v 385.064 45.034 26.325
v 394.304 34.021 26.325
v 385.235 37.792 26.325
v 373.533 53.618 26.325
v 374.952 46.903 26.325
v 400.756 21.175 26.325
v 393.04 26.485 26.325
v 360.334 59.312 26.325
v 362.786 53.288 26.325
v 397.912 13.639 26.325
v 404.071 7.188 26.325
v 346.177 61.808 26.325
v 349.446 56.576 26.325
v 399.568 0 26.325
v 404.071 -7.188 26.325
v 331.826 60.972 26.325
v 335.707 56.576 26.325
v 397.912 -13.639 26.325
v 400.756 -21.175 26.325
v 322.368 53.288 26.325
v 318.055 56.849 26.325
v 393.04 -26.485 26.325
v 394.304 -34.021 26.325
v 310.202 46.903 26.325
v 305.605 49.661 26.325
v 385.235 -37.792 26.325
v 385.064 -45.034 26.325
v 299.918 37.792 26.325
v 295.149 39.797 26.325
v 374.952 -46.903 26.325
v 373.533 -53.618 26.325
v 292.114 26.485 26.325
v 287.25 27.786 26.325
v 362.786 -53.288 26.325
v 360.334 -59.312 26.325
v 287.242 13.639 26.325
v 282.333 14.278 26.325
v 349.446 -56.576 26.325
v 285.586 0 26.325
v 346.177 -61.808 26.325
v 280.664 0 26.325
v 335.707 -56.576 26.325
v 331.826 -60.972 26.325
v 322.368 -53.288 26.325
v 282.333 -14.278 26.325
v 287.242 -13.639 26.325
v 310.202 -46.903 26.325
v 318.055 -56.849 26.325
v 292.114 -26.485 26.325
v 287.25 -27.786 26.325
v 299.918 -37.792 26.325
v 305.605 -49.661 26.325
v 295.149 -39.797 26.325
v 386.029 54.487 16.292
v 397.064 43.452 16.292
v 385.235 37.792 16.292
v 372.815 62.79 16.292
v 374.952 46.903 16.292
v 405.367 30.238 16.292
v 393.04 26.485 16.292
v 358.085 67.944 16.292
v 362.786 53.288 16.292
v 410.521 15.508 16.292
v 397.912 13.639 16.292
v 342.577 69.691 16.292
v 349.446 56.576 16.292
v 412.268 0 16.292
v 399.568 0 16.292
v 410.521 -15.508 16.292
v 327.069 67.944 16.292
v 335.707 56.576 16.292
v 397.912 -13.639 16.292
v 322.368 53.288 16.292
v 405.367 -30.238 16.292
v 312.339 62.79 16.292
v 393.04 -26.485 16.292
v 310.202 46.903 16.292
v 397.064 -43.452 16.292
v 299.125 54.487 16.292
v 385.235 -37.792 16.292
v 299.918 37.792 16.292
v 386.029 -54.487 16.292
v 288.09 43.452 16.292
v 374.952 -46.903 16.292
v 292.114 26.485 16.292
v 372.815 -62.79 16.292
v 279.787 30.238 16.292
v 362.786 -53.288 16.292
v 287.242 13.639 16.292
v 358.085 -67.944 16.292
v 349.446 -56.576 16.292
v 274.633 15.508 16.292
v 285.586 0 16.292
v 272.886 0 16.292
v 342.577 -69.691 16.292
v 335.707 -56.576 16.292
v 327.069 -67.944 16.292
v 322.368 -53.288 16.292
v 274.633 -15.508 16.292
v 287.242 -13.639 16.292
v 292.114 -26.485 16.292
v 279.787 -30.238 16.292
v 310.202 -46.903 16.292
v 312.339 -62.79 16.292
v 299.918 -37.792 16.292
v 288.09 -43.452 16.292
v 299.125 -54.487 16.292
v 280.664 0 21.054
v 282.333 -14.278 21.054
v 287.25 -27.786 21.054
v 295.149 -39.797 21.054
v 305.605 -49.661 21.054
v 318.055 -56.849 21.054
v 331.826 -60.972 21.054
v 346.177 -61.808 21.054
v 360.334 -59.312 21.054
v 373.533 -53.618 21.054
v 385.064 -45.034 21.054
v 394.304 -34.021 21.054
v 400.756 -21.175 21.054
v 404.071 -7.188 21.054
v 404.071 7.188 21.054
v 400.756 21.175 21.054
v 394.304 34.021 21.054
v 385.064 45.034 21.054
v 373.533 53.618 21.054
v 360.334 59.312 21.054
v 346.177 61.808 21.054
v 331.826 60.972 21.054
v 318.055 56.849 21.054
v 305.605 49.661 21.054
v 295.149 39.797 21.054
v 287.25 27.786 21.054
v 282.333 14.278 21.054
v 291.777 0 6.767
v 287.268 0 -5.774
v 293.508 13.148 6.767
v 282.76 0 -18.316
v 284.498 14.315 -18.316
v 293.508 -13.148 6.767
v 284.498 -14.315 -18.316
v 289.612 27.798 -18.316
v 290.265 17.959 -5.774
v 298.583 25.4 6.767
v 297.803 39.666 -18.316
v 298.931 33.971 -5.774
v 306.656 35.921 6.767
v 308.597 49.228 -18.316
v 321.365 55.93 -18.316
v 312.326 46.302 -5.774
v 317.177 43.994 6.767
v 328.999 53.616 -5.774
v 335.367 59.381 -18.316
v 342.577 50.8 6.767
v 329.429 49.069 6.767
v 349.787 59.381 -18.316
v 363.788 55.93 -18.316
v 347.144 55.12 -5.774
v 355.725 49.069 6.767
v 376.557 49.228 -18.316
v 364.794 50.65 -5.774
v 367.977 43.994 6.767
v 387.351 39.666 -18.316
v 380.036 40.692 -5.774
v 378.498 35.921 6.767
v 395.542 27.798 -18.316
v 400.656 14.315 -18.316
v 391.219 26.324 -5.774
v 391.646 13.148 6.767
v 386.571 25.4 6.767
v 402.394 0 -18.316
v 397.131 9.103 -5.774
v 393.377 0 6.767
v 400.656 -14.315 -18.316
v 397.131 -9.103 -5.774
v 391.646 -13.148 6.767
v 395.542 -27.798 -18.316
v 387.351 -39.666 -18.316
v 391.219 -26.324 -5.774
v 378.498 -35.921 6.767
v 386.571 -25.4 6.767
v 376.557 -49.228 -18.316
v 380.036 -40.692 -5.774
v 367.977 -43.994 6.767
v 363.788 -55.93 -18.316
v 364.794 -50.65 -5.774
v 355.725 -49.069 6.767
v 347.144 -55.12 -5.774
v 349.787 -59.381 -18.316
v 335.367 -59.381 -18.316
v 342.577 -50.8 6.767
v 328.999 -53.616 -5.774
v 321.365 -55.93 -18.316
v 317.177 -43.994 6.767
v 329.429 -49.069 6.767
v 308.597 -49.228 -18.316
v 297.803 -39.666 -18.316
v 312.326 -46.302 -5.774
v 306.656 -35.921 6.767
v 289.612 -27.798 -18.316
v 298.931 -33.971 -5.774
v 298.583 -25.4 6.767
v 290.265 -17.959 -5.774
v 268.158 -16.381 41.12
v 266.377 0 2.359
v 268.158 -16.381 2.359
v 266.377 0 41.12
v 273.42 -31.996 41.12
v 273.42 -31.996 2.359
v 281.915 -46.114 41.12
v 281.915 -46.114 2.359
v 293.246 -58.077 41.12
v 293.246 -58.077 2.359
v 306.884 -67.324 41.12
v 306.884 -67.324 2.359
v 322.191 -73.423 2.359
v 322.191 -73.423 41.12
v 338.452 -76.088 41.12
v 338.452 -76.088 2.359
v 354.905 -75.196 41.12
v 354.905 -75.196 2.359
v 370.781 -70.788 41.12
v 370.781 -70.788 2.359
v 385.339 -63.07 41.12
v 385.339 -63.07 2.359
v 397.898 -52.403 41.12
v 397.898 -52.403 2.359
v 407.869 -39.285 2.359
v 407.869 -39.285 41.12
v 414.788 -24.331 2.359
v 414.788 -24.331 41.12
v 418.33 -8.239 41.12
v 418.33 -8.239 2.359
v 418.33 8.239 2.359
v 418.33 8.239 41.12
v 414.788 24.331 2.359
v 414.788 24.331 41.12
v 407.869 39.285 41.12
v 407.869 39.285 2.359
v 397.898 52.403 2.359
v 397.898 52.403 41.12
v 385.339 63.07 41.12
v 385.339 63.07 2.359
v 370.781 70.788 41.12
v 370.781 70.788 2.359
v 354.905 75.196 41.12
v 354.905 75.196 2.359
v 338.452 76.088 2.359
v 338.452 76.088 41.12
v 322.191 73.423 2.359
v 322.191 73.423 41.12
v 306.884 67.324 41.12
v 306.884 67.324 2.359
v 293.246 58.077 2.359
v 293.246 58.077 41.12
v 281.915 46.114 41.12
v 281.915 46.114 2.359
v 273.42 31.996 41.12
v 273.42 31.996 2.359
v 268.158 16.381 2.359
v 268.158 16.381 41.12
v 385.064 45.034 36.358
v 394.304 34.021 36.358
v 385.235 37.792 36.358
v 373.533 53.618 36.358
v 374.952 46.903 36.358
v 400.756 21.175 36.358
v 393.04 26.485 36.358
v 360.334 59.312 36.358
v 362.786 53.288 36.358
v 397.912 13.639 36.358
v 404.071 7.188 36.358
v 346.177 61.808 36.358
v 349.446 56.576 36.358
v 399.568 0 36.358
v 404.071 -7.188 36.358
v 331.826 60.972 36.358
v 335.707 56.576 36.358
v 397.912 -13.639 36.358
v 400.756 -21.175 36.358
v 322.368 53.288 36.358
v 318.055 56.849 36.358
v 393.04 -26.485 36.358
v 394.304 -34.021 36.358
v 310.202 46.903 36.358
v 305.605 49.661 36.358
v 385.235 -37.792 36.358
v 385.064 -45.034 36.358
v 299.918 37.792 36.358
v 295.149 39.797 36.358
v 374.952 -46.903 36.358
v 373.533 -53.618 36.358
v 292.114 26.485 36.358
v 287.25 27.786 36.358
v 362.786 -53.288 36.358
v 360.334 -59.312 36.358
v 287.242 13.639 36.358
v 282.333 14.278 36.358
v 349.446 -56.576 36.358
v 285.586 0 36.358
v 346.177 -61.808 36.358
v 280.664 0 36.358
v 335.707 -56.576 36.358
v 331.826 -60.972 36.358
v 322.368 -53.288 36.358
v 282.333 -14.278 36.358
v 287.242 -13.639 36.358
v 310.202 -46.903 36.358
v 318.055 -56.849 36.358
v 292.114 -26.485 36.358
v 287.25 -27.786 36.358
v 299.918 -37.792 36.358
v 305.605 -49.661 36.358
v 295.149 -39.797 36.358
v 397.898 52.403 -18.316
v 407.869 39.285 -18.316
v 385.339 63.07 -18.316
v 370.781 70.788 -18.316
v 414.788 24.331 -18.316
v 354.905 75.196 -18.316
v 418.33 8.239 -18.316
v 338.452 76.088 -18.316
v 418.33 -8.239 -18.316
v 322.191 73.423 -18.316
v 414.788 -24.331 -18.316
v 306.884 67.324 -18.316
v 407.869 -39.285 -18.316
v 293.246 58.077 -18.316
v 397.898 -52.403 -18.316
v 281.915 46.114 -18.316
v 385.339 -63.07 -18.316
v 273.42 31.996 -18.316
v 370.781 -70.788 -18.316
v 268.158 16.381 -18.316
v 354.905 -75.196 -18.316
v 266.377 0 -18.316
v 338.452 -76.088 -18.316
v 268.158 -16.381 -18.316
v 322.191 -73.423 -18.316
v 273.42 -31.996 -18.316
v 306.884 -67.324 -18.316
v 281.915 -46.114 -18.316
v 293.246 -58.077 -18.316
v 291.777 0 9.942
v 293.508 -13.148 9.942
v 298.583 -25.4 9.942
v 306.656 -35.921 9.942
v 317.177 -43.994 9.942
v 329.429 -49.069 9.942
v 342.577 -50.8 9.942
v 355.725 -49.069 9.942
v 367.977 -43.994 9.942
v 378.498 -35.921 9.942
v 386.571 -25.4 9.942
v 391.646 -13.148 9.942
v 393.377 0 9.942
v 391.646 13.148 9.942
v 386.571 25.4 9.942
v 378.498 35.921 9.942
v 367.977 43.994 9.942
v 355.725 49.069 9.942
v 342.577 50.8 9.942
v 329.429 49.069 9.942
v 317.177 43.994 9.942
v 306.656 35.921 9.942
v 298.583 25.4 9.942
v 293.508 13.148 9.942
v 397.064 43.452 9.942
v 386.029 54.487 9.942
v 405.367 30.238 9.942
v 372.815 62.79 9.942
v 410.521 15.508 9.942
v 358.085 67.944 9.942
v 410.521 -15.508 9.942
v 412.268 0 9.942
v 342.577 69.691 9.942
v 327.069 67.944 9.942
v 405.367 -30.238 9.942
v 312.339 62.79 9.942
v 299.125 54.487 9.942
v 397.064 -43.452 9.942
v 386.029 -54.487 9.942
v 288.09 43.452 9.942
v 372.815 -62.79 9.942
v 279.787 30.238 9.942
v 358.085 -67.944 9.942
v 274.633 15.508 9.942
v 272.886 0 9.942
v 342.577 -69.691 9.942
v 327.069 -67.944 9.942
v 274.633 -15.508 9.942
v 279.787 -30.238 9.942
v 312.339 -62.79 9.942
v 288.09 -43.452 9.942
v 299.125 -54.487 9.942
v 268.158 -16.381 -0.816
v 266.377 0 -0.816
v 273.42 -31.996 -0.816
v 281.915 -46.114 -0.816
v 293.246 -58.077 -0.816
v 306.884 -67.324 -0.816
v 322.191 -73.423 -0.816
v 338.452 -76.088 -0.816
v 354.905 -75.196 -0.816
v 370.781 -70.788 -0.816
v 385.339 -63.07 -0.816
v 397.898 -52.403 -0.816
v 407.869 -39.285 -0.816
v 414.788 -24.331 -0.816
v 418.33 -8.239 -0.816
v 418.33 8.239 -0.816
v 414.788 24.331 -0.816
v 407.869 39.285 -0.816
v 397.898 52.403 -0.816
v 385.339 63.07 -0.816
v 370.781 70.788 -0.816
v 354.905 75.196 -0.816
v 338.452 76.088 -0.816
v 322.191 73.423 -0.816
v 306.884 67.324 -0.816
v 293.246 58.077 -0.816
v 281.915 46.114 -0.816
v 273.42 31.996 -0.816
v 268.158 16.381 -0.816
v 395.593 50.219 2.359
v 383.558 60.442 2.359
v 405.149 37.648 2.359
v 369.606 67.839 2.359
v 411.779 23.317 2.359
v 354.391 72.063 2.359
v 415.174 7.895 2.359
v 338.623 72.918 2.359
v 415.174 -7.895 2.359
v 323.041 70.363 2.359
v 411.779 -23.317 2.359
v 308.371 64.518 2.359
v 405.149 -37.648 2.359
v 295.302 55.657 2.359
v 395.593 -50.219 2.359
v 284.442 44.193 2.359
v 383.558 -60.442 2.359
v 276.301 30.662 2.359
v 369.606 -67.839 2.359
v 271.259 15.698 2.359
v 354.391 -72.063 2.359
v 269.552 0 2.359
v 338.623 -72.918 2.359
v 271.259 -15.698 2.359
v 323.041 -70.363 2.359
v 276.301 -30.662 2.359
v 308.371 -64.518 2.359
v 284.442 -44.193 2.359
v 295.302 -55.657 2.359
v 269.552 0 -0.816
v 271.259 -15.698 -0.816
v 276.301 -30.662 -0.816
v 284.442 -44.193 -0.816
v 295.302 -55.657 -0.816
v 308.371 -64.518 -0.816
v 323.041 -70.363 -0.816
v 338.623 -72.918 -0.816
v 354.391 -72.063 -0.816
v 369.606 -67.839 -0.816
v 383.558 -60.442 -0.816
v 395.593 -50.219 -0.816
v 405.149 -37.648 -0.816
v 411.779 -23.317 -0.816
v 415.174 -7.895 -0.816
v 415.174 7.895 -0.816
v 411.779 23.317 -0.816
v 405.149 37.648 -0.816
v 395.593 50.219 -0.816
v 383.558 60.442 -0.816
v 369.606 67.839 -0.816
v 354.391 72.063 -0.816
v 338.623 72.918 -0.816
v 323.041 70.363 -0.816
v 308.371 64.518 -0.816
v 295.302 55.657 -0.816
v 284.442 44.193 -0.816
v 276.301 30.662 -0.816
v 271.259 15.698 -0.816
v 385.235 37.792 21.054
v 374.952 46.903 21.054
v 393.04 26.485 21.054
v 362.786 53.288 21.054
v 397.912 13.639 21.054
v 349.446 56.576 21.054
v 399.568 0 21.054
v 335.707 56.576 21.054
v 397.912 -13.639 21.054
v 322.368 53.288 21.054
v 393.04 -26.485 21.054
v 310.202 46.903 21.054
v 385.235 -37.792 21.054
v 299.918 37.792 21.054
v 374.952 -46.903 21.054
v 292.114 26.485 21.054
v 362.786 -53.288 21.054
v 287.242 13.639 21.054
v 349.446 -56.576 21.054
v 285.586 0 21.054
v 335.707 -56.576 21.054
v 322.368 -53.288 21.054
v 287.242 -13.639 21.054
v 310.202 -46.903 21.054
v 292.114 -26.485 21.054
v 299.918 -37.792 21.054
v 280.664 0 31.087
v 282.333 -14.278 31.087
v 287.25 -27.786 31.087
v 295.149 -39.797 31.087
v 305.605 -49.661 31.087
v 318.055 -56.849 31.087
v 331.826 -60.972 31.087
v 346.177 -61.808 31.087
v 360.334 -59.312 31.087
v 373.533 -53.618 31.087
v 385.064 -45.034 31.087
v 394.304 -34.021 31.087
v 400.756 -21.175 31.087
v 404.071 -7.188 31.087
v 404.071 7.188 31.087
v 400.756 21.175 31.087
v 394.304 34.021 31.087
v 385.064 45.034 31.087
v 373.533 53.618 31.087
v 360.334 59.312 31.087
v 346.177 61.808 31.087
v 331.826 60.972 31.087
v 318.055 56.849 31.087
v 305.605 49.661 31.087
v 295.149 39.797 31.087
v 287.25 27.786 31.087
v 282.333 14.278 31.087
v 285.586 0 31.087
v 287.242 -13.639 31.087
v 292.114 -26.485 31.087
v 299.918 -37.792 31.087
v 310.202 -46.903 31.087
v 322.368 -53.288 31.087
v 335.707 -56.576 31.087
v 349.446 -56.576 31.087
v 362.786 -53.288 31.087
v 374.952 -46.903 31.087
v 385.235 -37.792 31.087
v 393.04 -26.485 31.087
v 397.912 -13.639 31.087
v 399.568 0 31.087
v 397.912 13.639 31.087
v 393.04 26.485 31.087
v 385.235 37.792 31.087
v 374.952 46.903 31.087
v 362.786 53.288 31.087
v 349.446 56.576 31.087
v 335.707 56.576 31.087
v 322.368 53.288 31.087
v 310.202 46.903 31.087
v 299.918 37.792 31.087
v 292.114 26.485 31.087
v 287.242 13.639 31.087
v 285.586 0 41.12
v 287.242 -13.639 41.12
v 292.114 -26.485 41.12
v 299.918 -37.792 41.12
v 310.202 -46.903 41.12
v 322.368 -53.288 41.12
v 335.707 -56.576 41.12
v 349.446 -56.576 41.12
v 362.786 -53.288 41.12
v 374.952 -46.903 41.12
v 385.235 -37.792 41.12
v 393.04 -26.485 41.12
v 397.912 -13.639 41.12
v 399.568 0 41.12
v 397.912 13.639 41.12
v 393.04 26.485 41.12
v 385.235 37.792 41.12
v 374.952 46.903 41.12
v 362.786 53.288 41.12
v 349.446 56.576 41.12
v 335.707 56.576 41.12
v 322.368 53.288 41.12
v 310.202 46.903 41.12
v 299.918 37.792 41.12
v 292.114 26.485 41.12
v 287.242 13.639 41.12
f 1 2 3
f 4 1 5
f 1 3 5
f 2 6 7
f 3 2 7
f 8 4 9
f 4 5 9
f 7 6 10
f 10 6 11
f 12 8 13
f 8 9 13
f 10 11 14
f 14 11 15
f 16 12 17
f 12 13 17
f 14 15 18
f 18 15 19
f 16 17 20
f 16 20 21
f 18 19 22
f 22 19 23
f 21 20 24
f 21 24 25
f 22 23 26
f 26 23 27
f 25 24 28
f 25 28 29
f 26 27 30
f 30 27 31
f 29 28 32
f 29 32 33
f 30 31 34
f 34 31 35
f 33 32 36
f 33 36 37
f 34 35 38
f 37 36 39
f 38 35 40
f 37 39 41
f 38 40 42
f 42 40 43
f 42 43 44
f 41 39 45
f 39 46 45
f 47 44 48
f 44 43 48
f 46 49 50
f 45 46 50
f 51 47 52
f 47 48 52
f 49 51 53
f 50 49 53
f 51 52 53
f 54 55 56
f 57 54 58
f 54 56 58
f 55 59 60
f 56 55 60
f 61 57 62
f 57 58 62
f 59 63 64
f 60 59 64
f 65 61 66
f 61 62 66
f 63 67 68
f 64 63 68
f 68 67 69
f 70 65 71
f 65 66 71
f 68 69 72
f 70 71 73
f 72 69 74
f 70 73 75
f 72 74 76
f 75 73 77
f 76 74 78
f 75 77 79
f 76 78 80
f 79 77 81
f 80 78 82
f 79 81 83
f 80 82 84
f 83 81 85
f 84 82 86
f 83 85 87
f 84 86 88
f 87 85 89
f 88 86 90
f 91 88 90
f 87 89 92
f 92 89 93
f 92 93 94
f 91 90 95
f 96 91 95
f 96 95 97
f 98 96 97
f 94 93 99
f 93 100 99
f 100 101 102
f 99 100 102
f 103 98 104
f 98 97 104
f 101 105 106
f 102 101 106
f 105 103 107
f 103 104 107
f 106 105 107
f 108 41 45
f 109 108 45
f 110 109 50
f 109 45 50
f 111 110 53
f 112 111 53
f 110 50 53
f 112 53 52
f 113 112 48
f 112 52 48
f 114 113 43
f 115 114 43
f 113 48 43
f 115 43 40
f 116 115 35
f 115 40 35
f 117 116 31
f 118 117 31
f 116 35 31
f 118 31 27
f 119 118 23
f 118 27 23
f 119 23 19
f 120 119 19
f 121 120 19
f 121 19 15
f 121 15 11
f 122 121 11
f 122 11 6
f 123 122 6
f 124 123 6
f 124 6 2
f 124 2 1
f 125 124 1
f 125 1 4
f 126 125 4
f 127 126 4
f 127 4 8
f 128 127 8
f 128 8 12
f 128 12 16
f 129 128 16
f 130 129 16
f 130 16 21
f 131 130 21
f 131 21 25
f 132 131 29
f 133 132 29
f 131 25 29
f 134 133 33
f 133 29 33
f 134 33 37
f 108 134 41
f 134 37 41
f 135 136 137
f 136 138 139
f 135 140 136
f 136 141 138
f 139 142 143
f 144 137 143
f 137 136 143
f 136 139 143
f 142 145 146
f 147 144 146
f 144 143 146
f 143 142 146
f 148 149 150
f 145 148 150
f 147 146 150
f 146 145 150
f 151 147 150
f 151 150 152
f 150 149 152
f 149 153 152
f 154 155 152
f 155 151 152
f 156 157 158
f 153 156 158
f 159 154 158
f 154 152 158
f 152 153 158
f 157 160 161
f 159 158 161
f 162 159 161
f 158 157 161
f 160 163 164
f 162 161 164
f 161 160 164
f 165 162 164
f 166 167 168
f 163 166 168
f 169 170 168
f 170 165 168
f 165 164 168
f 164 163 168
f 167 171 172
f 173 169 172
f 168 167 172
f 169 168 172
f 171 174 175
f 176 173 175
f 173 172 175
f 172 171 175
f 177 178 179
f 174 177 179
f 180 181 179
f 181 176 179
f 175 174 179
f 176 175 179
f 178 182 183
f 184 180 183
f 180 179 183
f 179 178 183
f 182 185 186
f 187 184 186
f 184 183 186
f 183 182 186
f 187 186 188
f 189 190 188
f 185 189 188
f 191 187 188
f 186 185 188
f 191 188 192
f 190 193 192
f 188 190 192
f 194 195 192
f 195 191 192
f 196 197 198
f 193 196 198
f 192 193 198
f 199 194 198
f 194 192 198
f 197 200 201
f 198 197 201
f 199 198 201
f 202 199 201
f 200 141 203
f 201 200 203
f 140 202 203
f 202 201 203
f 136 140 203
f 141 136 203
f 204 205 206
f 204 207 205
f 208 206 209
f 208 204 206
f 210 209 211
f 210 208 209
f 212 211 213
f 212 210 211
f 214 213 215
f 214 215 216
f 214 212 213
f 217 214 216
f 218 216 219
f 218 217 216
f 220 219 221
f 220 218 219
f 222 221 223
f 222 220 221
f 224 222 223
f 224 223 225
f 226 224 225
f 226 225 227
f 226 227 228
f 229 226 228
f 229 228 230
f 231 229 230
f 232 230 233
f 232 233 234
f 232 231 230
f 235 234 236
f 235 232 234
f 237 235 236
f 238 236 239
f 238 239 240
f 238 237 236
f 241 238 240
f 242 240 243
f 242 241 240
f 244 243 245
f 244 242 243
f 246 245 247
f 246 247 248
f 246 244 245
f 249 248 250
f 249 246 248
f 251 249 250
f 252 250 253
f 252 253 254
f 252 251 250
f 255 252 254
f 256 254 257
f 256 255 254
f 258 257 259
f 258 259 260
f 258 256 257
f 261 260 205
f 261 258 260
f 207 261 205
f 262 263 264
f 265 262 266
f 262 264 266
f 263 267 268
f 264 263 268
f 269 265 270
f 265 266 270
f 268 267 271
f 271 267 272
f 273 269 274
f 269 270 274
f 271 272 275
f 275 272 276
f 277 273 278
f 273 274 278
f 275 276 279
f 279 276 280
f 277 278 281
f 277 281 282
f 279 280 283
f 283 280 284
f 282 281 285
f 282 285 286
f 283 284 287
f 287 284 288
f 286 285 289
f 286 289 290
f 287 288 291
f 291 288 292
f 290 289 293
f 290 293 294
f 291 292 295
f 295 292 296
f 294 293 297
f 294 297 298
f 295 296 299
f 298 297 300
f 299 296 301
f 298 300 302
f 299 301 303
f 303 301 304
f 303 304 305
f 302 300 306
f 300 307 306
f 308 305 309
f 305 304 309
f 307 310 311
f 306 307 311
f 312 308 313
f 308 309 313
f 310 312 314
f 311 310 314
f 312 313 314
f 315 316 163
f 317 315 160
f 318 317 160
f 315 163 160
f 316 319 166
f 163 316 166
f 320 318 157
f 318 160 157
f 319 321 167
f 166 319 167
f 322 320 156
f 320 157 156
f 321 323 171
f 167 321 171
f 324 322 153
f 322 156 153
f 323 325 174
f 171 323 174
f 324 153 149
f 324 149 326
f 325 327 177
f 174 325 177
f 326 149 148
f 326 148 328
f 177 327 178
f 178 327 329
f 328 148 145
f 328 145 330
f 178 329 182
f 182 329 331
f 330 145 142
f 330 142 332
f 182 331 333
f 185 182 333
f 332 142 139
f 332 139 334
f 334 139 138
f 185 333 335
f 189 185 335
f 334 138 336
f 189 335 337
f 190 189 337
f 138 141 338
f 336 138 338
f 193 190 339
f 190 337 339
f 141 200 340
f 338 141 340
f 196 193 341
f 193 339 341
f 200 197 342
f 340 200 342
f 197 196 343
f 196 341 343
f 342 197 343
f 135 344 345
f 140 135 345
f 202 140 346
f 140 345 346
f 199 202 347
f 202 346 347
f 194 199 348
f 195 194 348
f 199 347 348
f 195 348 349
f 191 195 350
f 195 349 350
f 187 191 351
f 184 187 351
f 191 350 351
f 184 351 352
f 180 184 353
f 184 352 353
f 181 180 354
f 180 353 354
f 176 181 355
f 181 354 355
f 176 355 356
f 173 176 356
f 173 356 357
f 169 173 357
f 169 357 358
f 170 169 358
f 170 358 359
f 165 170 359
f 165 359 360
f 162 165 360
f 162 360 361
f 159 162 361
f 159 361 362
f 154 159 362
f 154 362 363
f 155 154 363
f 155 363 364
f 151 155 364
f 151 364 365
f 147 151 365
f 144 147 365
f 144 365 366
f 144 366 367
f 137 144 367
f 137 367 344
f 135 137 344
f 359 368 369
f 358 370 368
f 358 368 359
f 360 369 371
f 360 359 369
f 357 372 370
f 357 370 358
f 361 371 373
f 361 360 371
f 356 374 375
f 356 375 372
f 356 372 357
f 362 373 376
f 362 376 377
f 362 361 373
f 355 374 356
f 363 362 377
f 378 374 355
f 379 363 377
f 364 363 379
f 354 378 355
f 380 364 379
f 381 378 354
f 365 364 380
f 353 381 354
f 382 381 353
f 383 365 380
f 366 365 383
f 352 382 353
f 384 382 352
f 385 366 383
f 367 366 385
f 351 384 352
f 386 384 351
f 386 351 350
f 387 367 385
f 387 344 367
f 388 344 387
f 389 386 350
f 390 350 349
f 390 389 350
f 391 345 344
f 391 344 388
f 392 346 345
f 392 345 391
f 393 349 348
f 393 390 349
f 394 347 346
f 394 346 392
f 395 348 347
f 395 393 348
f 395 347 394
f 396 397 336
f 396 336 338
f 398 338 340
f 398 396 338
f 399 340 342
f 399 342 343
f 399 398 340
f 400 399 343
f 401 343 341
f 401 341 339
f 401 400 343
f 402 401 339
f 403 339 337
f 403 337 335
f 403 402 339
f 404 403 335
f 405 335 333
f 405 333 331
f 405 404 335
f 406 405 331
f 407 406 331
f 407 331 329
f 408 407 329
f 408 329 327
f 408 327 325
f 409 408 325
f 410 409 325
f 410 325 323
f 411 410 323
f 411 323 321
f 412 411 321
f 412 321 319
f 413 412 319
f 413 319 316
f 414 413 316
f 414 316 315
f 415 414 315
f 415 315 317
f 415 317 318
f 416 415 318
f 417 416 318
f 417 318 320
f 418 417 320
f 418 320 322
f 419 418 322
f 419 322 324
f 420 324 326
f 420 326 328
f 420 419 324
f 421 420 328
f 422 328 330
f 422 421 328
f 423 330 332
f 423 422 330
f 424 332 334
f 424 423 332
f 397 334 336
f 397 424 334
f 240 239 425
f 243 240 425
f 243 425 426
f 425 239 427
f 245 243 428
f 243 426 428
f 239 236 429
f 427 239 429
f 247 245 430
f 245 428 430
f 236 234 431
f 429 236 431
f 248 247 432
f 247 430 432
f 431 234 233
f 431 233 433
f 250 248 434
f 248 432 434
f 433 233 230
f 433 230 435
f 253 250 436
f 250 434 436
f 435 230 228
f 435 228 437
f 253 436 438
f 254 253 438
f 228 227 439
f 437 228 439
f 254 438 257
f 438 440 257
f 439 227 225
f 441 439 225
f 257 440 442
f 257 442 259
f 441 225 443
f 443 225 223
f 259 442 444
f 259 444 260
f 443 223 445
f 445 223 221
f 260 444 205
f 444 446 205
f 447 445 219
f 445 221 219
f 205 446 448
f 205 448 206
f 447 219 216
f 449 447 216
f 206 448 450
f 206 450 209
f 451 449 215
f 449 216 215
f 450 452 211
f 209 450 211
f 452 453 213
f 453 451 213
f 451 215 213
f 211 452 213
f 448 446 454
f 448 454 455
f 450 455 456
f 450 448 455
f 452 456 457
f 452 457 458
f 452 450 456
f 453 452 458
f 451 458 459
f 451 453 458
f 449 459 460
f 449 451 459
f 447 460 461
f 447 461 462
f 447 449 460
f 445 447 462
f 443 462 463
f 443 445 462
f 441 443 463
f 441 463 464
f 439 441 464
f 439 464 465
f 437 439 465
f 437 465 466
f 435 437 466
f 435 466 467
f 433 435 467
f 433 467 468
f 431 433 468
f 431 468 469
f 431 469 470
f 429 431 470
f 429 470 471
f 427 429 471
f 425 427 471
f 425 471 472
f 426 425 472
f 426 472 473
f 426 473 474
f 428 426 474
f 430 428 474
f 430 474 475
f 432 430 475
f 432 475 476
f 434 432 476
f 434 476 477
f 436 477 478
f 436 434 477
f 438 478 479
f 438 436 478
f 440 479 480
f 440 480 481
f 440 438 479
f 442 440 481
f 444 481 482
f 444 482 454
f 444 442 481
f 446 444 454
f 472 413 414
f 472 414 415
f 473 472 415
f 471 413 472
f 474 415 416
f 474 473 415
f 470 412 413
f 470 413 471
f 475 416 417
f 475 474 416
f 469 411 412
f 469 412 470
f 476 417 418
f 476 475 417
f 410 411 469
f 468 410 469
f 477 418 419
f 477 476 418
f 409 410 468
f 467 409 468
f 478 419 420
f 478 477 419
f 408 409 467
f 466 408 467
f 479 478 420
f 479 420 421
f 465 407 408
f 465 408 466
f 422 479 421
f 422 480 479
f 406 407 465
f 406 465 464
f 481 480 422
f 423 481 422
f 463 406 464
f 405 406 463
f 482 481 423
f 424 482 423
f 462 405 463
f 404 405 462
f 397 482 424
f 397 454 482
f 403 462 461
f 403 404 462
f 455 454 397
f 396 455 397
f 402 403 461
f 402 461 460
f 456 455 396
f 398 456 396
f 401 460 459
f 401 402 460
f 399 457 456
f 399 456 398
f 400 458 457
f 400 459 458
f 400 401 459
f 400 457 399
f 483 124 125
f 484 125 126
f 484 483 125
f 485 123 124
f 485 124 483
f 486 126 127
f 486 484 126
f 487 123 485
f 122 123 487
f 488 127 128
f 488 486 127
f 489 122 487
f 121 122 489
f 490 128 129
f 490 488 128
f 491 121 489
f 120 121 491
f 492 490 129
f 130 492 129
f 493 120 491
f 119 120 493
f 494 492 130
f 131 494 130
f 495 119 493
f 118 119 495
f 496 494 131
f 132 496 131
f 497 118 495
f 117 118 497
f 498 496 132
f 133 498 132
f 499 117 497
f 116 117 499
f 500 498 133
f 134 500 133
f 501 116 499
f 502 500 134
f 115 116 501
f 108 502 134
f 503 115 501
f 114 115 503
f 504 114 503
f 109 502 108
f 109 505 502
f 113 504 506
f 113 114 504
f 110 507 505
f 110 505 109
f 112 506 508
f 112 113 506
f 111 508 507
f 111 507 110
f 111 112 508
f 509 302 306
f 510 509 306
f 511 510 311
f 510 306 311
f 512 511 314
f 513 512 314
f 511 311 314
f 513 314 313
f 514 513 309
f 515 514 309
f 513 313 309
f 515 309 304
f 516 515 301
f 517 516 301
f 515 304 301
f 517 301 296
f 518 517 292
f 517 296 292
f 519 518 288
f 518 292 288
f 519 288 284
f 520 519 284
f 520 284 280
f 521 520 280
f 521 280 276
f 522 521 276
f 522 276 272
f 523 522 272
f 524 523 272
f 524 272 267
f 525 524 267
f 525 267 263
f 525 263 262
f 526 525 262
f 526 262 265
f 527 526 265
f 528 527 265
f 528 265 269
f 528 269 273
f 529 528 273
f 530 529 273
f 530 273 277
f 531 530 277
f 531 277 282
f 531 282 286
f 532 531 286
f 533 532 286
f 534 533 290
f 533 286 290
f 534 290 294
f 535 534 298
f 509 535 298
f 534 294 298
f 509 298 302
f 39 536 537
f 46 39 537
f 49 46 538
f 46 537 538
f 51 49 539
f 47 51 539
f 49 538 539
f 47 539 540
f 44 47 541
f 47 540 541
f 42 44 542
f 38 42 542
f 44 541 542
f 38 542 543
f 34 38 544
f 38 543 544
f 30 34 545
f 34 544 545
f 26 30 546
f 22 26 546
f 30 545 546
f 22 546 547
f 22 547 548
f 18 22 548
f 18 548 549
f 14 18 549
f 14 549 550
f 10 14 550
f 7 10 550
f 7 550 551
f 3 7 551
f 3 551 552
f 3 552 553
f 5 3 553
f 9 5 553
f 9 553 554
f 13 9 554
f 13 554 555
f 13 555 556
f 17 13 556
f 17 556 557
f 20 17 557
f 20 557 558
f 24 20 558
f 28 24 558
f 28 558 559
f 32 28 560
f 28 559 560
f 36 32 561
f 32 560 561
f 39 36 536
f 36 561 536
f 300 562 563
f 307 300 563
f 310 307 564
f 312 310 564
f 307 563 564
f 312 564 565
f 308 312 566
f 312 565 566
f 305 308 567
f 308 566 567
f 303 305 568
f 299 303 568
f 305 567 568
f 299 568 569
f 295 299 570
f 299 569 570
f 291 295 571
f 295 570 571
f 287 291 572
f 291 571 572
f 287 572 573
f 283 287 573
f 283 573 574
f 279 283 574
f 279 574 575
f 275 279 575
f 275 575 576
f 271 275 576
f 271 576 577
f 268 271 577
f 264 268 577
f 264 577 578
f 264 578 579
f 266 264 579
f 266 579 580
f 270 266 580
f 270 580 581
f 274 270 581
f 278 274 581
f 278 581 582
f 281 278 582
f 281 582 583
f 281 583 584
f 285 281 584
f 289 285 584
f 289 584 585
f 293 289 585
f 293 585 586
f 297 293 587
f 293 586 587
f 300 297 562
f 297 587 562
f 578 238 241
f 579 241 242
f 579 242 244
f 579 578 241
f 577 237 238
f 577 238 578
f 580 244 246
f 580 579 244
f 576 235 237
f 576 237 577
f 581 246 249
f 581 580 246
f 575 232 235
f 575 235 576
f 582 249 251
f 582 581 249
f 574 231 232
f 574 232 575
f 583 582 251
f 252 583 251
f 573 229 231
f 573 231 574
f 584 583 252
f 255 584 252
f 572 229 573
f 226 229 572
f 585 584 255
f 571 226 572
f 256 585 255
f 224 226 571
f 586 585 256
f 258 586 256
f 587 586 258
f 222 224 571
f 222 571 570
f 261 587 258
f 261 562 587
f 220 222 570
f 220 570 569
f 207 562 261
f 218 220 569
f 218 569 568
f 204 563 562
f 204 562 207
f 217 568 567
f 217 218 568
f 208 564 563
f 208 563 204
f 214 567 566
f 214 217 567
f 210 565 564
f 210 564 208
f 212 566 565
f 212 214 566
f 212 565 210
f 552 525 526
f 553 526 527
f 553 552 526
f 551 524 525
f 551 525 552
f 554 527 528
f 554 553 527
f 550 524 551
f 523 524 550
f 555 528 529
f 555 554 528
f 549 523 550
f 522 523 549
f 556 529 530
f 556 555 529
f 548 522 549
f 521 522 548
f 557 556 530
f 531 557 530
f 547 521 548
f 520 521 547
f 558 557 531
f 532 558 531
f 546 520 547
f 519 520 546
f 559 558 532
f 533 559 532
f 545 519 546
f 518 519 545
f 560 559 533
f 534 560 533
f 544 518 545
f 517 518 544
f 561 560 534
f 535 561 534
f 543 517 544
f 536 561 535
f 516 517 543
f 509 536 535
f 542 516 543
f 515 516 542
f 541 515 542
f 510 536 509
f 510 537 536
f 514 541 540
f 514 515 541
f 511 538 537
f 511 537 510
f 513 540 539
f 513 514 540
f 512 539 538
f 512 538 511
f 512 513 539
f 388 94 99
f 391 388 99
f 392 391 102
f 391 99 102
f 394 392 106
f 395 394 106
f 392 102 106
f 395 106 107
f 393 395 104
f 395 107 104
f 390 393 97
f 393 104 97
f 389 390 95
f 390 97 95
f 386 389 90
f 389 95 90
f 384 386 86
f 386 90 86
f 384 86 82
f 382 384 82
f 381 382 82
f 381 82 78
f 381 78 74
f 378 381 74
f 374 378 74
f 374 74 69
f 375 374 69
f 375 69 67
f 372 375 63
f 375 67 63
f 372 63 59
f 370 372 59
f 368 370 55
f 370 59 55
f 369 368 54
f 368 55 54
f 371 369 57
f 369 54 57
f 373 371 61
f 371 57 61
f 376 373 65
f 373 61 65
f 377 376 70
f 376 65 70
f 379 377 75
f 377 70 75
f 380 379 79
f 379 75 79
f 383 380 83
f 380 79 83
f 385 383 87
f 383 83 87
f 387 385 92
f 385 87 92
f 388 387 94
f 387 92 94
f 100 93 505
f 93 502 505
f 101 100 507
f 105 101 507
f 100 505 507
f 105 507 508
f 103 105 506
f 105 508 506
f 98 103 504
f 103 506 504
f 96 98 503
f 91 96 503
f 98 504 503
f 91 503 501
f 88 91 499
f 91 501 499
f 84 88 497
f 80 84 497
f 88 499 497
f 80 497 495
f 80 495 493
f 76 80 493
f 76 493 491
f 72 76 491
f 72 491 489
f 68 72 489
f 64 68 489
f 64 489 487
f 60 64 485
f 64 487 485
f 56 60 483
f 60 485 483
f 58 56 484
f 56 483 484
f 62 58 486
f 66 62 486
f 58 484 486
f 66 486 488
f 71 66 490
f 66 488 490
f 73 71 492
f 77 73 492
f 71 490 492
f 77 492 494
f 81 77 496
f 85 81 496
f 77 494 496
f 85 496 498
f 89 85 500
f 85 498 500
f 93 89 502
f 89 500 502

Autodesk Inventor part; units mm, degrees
ref_plane "YZ Plane" through (0, 0, 0) normal (1, 0, 0) x (0, 1, 0)
ref_plane "XZ Plane" through (0, 0, 0) normal (0, 1, 0) x (-1, 0, 0)
ref_plane "XY Plane" through (0, 0, 0) normal (0, 0, 1) x (1, 0, 0)
sketch "Sketch5" plane through (0, 0, 0) normal (0, 1, 0) x (-1, 0, 0)
  line L0 (-272.8857, 16.2919) -> (-285.5857, 16.2919)
  line L1 (-285.5857, 16.2919) -> (-285.5857, 21.0544)
  line L2 (-285.5857, 21.0544) -> (-280.6644, 21.0544)
  line L3 (-280.6644, 26.3249) -> (-285.5857, 26.3249)
  line L4 (-280.6644, 21.0544) -> (-280.6644, 26.3249)
  line L5 (-280.6644, 31.0874) -> (-285.5857, 31.0874)
  line L6 (-285.5857, 26.3249) -> (-285.5857, 31.0874)
  line L7 (-280.6644, 31.0874) -> (-280.6644, 36.3579)
  line L8 (-285.5857, 36.3579) -> (-285.5857, 41.1204)
  line L9 (-285.5857, 41.1204) -> (-266.3769, 41.1204)
  line L10 (-272.8857, 9.9419) -> (-272.8857, 16.2919)
  line L11 (-266.3769, -18.3156) -> (-266.3769, 41.1204)
  line L12 (-291.7769, 9.9419) -> (-272.8857, 9.9419)
  line L13 (-282.7599, -18.3156) -> (-266.3769, -18.3156)
  line L14 (-291.7769, 6.7669) -> (-282.7599, -18.3156)
  line L15 (-291.7769, 6.7669) -> (-291.7769, 9.9419)
  line L16 (-280.6644, 36.3579) -> (-285.5857, 36.3579)
  line L17 (-342.5769, -58.268) -> (-342.5769, 69.8263)
  line L18 (-266.3769, -0.8164) -> (-269.5519, -0.8164)
  line L19 (-269.5519, -0.8164) -> (-269.5519, 2.3586)
  line L20 (-269.5519, 2.3586) -> (-266.3769, 2.3586)
  point P0 (0, 0)
  dimension "d34" = 3.175
  dimension "d35" = 9.017
  dimension "d36" = 50.8
  dimension "d37" = 76.2
  dimension "d39" = 61.9125
  dimension "d40" = 6.35
  dimension "d41" = 56.9913
  dimension "d42" = 12.7
  dimension "d43" = 3.175
  dimension "d44" = 3.175
  dimension "d45" = 17.4992
  dimension "d46" = 28.2575
  dimension "d47" = 4.7625
revolve "Revolution2" add sketch "Sketch5" angle 360 about axis through (342.5769, 0, -58.268) along (0, 0, 1) contours L0 L1 L2 L4 L3 L6 L5 L7 L16 L8 L9 L11 L20 L19 L18 L13 L14 L15 L12 L10
equation "\"d41\" = 0.5 * WashChamberOD - SealedSurfaceOffset"
equation "\"d47\" = StaticORingThickness"
equation "\"MachineMaxHeight\" = 539.75"
equation "\"MachineMaxWidth\" = 215.9"
equation "\"MachineMaxLength\" = 266.7"
equation "\"MachineFluidCapacity\" = 25.4"
equation "\"MaxCompressiveCapacity\" = 20320"
equation "\"WashChamberID\" = 101.6"
equation "\"WashChamberOD\" = 114.3"
equation "\"ConduitThickness\" = 152.4"
equation "\"StaticORingThickness\" = 4.7625"
equation "\"SealedSurfaceOffset\" = 0.15875"
properties part number "WashChamberConduit"
